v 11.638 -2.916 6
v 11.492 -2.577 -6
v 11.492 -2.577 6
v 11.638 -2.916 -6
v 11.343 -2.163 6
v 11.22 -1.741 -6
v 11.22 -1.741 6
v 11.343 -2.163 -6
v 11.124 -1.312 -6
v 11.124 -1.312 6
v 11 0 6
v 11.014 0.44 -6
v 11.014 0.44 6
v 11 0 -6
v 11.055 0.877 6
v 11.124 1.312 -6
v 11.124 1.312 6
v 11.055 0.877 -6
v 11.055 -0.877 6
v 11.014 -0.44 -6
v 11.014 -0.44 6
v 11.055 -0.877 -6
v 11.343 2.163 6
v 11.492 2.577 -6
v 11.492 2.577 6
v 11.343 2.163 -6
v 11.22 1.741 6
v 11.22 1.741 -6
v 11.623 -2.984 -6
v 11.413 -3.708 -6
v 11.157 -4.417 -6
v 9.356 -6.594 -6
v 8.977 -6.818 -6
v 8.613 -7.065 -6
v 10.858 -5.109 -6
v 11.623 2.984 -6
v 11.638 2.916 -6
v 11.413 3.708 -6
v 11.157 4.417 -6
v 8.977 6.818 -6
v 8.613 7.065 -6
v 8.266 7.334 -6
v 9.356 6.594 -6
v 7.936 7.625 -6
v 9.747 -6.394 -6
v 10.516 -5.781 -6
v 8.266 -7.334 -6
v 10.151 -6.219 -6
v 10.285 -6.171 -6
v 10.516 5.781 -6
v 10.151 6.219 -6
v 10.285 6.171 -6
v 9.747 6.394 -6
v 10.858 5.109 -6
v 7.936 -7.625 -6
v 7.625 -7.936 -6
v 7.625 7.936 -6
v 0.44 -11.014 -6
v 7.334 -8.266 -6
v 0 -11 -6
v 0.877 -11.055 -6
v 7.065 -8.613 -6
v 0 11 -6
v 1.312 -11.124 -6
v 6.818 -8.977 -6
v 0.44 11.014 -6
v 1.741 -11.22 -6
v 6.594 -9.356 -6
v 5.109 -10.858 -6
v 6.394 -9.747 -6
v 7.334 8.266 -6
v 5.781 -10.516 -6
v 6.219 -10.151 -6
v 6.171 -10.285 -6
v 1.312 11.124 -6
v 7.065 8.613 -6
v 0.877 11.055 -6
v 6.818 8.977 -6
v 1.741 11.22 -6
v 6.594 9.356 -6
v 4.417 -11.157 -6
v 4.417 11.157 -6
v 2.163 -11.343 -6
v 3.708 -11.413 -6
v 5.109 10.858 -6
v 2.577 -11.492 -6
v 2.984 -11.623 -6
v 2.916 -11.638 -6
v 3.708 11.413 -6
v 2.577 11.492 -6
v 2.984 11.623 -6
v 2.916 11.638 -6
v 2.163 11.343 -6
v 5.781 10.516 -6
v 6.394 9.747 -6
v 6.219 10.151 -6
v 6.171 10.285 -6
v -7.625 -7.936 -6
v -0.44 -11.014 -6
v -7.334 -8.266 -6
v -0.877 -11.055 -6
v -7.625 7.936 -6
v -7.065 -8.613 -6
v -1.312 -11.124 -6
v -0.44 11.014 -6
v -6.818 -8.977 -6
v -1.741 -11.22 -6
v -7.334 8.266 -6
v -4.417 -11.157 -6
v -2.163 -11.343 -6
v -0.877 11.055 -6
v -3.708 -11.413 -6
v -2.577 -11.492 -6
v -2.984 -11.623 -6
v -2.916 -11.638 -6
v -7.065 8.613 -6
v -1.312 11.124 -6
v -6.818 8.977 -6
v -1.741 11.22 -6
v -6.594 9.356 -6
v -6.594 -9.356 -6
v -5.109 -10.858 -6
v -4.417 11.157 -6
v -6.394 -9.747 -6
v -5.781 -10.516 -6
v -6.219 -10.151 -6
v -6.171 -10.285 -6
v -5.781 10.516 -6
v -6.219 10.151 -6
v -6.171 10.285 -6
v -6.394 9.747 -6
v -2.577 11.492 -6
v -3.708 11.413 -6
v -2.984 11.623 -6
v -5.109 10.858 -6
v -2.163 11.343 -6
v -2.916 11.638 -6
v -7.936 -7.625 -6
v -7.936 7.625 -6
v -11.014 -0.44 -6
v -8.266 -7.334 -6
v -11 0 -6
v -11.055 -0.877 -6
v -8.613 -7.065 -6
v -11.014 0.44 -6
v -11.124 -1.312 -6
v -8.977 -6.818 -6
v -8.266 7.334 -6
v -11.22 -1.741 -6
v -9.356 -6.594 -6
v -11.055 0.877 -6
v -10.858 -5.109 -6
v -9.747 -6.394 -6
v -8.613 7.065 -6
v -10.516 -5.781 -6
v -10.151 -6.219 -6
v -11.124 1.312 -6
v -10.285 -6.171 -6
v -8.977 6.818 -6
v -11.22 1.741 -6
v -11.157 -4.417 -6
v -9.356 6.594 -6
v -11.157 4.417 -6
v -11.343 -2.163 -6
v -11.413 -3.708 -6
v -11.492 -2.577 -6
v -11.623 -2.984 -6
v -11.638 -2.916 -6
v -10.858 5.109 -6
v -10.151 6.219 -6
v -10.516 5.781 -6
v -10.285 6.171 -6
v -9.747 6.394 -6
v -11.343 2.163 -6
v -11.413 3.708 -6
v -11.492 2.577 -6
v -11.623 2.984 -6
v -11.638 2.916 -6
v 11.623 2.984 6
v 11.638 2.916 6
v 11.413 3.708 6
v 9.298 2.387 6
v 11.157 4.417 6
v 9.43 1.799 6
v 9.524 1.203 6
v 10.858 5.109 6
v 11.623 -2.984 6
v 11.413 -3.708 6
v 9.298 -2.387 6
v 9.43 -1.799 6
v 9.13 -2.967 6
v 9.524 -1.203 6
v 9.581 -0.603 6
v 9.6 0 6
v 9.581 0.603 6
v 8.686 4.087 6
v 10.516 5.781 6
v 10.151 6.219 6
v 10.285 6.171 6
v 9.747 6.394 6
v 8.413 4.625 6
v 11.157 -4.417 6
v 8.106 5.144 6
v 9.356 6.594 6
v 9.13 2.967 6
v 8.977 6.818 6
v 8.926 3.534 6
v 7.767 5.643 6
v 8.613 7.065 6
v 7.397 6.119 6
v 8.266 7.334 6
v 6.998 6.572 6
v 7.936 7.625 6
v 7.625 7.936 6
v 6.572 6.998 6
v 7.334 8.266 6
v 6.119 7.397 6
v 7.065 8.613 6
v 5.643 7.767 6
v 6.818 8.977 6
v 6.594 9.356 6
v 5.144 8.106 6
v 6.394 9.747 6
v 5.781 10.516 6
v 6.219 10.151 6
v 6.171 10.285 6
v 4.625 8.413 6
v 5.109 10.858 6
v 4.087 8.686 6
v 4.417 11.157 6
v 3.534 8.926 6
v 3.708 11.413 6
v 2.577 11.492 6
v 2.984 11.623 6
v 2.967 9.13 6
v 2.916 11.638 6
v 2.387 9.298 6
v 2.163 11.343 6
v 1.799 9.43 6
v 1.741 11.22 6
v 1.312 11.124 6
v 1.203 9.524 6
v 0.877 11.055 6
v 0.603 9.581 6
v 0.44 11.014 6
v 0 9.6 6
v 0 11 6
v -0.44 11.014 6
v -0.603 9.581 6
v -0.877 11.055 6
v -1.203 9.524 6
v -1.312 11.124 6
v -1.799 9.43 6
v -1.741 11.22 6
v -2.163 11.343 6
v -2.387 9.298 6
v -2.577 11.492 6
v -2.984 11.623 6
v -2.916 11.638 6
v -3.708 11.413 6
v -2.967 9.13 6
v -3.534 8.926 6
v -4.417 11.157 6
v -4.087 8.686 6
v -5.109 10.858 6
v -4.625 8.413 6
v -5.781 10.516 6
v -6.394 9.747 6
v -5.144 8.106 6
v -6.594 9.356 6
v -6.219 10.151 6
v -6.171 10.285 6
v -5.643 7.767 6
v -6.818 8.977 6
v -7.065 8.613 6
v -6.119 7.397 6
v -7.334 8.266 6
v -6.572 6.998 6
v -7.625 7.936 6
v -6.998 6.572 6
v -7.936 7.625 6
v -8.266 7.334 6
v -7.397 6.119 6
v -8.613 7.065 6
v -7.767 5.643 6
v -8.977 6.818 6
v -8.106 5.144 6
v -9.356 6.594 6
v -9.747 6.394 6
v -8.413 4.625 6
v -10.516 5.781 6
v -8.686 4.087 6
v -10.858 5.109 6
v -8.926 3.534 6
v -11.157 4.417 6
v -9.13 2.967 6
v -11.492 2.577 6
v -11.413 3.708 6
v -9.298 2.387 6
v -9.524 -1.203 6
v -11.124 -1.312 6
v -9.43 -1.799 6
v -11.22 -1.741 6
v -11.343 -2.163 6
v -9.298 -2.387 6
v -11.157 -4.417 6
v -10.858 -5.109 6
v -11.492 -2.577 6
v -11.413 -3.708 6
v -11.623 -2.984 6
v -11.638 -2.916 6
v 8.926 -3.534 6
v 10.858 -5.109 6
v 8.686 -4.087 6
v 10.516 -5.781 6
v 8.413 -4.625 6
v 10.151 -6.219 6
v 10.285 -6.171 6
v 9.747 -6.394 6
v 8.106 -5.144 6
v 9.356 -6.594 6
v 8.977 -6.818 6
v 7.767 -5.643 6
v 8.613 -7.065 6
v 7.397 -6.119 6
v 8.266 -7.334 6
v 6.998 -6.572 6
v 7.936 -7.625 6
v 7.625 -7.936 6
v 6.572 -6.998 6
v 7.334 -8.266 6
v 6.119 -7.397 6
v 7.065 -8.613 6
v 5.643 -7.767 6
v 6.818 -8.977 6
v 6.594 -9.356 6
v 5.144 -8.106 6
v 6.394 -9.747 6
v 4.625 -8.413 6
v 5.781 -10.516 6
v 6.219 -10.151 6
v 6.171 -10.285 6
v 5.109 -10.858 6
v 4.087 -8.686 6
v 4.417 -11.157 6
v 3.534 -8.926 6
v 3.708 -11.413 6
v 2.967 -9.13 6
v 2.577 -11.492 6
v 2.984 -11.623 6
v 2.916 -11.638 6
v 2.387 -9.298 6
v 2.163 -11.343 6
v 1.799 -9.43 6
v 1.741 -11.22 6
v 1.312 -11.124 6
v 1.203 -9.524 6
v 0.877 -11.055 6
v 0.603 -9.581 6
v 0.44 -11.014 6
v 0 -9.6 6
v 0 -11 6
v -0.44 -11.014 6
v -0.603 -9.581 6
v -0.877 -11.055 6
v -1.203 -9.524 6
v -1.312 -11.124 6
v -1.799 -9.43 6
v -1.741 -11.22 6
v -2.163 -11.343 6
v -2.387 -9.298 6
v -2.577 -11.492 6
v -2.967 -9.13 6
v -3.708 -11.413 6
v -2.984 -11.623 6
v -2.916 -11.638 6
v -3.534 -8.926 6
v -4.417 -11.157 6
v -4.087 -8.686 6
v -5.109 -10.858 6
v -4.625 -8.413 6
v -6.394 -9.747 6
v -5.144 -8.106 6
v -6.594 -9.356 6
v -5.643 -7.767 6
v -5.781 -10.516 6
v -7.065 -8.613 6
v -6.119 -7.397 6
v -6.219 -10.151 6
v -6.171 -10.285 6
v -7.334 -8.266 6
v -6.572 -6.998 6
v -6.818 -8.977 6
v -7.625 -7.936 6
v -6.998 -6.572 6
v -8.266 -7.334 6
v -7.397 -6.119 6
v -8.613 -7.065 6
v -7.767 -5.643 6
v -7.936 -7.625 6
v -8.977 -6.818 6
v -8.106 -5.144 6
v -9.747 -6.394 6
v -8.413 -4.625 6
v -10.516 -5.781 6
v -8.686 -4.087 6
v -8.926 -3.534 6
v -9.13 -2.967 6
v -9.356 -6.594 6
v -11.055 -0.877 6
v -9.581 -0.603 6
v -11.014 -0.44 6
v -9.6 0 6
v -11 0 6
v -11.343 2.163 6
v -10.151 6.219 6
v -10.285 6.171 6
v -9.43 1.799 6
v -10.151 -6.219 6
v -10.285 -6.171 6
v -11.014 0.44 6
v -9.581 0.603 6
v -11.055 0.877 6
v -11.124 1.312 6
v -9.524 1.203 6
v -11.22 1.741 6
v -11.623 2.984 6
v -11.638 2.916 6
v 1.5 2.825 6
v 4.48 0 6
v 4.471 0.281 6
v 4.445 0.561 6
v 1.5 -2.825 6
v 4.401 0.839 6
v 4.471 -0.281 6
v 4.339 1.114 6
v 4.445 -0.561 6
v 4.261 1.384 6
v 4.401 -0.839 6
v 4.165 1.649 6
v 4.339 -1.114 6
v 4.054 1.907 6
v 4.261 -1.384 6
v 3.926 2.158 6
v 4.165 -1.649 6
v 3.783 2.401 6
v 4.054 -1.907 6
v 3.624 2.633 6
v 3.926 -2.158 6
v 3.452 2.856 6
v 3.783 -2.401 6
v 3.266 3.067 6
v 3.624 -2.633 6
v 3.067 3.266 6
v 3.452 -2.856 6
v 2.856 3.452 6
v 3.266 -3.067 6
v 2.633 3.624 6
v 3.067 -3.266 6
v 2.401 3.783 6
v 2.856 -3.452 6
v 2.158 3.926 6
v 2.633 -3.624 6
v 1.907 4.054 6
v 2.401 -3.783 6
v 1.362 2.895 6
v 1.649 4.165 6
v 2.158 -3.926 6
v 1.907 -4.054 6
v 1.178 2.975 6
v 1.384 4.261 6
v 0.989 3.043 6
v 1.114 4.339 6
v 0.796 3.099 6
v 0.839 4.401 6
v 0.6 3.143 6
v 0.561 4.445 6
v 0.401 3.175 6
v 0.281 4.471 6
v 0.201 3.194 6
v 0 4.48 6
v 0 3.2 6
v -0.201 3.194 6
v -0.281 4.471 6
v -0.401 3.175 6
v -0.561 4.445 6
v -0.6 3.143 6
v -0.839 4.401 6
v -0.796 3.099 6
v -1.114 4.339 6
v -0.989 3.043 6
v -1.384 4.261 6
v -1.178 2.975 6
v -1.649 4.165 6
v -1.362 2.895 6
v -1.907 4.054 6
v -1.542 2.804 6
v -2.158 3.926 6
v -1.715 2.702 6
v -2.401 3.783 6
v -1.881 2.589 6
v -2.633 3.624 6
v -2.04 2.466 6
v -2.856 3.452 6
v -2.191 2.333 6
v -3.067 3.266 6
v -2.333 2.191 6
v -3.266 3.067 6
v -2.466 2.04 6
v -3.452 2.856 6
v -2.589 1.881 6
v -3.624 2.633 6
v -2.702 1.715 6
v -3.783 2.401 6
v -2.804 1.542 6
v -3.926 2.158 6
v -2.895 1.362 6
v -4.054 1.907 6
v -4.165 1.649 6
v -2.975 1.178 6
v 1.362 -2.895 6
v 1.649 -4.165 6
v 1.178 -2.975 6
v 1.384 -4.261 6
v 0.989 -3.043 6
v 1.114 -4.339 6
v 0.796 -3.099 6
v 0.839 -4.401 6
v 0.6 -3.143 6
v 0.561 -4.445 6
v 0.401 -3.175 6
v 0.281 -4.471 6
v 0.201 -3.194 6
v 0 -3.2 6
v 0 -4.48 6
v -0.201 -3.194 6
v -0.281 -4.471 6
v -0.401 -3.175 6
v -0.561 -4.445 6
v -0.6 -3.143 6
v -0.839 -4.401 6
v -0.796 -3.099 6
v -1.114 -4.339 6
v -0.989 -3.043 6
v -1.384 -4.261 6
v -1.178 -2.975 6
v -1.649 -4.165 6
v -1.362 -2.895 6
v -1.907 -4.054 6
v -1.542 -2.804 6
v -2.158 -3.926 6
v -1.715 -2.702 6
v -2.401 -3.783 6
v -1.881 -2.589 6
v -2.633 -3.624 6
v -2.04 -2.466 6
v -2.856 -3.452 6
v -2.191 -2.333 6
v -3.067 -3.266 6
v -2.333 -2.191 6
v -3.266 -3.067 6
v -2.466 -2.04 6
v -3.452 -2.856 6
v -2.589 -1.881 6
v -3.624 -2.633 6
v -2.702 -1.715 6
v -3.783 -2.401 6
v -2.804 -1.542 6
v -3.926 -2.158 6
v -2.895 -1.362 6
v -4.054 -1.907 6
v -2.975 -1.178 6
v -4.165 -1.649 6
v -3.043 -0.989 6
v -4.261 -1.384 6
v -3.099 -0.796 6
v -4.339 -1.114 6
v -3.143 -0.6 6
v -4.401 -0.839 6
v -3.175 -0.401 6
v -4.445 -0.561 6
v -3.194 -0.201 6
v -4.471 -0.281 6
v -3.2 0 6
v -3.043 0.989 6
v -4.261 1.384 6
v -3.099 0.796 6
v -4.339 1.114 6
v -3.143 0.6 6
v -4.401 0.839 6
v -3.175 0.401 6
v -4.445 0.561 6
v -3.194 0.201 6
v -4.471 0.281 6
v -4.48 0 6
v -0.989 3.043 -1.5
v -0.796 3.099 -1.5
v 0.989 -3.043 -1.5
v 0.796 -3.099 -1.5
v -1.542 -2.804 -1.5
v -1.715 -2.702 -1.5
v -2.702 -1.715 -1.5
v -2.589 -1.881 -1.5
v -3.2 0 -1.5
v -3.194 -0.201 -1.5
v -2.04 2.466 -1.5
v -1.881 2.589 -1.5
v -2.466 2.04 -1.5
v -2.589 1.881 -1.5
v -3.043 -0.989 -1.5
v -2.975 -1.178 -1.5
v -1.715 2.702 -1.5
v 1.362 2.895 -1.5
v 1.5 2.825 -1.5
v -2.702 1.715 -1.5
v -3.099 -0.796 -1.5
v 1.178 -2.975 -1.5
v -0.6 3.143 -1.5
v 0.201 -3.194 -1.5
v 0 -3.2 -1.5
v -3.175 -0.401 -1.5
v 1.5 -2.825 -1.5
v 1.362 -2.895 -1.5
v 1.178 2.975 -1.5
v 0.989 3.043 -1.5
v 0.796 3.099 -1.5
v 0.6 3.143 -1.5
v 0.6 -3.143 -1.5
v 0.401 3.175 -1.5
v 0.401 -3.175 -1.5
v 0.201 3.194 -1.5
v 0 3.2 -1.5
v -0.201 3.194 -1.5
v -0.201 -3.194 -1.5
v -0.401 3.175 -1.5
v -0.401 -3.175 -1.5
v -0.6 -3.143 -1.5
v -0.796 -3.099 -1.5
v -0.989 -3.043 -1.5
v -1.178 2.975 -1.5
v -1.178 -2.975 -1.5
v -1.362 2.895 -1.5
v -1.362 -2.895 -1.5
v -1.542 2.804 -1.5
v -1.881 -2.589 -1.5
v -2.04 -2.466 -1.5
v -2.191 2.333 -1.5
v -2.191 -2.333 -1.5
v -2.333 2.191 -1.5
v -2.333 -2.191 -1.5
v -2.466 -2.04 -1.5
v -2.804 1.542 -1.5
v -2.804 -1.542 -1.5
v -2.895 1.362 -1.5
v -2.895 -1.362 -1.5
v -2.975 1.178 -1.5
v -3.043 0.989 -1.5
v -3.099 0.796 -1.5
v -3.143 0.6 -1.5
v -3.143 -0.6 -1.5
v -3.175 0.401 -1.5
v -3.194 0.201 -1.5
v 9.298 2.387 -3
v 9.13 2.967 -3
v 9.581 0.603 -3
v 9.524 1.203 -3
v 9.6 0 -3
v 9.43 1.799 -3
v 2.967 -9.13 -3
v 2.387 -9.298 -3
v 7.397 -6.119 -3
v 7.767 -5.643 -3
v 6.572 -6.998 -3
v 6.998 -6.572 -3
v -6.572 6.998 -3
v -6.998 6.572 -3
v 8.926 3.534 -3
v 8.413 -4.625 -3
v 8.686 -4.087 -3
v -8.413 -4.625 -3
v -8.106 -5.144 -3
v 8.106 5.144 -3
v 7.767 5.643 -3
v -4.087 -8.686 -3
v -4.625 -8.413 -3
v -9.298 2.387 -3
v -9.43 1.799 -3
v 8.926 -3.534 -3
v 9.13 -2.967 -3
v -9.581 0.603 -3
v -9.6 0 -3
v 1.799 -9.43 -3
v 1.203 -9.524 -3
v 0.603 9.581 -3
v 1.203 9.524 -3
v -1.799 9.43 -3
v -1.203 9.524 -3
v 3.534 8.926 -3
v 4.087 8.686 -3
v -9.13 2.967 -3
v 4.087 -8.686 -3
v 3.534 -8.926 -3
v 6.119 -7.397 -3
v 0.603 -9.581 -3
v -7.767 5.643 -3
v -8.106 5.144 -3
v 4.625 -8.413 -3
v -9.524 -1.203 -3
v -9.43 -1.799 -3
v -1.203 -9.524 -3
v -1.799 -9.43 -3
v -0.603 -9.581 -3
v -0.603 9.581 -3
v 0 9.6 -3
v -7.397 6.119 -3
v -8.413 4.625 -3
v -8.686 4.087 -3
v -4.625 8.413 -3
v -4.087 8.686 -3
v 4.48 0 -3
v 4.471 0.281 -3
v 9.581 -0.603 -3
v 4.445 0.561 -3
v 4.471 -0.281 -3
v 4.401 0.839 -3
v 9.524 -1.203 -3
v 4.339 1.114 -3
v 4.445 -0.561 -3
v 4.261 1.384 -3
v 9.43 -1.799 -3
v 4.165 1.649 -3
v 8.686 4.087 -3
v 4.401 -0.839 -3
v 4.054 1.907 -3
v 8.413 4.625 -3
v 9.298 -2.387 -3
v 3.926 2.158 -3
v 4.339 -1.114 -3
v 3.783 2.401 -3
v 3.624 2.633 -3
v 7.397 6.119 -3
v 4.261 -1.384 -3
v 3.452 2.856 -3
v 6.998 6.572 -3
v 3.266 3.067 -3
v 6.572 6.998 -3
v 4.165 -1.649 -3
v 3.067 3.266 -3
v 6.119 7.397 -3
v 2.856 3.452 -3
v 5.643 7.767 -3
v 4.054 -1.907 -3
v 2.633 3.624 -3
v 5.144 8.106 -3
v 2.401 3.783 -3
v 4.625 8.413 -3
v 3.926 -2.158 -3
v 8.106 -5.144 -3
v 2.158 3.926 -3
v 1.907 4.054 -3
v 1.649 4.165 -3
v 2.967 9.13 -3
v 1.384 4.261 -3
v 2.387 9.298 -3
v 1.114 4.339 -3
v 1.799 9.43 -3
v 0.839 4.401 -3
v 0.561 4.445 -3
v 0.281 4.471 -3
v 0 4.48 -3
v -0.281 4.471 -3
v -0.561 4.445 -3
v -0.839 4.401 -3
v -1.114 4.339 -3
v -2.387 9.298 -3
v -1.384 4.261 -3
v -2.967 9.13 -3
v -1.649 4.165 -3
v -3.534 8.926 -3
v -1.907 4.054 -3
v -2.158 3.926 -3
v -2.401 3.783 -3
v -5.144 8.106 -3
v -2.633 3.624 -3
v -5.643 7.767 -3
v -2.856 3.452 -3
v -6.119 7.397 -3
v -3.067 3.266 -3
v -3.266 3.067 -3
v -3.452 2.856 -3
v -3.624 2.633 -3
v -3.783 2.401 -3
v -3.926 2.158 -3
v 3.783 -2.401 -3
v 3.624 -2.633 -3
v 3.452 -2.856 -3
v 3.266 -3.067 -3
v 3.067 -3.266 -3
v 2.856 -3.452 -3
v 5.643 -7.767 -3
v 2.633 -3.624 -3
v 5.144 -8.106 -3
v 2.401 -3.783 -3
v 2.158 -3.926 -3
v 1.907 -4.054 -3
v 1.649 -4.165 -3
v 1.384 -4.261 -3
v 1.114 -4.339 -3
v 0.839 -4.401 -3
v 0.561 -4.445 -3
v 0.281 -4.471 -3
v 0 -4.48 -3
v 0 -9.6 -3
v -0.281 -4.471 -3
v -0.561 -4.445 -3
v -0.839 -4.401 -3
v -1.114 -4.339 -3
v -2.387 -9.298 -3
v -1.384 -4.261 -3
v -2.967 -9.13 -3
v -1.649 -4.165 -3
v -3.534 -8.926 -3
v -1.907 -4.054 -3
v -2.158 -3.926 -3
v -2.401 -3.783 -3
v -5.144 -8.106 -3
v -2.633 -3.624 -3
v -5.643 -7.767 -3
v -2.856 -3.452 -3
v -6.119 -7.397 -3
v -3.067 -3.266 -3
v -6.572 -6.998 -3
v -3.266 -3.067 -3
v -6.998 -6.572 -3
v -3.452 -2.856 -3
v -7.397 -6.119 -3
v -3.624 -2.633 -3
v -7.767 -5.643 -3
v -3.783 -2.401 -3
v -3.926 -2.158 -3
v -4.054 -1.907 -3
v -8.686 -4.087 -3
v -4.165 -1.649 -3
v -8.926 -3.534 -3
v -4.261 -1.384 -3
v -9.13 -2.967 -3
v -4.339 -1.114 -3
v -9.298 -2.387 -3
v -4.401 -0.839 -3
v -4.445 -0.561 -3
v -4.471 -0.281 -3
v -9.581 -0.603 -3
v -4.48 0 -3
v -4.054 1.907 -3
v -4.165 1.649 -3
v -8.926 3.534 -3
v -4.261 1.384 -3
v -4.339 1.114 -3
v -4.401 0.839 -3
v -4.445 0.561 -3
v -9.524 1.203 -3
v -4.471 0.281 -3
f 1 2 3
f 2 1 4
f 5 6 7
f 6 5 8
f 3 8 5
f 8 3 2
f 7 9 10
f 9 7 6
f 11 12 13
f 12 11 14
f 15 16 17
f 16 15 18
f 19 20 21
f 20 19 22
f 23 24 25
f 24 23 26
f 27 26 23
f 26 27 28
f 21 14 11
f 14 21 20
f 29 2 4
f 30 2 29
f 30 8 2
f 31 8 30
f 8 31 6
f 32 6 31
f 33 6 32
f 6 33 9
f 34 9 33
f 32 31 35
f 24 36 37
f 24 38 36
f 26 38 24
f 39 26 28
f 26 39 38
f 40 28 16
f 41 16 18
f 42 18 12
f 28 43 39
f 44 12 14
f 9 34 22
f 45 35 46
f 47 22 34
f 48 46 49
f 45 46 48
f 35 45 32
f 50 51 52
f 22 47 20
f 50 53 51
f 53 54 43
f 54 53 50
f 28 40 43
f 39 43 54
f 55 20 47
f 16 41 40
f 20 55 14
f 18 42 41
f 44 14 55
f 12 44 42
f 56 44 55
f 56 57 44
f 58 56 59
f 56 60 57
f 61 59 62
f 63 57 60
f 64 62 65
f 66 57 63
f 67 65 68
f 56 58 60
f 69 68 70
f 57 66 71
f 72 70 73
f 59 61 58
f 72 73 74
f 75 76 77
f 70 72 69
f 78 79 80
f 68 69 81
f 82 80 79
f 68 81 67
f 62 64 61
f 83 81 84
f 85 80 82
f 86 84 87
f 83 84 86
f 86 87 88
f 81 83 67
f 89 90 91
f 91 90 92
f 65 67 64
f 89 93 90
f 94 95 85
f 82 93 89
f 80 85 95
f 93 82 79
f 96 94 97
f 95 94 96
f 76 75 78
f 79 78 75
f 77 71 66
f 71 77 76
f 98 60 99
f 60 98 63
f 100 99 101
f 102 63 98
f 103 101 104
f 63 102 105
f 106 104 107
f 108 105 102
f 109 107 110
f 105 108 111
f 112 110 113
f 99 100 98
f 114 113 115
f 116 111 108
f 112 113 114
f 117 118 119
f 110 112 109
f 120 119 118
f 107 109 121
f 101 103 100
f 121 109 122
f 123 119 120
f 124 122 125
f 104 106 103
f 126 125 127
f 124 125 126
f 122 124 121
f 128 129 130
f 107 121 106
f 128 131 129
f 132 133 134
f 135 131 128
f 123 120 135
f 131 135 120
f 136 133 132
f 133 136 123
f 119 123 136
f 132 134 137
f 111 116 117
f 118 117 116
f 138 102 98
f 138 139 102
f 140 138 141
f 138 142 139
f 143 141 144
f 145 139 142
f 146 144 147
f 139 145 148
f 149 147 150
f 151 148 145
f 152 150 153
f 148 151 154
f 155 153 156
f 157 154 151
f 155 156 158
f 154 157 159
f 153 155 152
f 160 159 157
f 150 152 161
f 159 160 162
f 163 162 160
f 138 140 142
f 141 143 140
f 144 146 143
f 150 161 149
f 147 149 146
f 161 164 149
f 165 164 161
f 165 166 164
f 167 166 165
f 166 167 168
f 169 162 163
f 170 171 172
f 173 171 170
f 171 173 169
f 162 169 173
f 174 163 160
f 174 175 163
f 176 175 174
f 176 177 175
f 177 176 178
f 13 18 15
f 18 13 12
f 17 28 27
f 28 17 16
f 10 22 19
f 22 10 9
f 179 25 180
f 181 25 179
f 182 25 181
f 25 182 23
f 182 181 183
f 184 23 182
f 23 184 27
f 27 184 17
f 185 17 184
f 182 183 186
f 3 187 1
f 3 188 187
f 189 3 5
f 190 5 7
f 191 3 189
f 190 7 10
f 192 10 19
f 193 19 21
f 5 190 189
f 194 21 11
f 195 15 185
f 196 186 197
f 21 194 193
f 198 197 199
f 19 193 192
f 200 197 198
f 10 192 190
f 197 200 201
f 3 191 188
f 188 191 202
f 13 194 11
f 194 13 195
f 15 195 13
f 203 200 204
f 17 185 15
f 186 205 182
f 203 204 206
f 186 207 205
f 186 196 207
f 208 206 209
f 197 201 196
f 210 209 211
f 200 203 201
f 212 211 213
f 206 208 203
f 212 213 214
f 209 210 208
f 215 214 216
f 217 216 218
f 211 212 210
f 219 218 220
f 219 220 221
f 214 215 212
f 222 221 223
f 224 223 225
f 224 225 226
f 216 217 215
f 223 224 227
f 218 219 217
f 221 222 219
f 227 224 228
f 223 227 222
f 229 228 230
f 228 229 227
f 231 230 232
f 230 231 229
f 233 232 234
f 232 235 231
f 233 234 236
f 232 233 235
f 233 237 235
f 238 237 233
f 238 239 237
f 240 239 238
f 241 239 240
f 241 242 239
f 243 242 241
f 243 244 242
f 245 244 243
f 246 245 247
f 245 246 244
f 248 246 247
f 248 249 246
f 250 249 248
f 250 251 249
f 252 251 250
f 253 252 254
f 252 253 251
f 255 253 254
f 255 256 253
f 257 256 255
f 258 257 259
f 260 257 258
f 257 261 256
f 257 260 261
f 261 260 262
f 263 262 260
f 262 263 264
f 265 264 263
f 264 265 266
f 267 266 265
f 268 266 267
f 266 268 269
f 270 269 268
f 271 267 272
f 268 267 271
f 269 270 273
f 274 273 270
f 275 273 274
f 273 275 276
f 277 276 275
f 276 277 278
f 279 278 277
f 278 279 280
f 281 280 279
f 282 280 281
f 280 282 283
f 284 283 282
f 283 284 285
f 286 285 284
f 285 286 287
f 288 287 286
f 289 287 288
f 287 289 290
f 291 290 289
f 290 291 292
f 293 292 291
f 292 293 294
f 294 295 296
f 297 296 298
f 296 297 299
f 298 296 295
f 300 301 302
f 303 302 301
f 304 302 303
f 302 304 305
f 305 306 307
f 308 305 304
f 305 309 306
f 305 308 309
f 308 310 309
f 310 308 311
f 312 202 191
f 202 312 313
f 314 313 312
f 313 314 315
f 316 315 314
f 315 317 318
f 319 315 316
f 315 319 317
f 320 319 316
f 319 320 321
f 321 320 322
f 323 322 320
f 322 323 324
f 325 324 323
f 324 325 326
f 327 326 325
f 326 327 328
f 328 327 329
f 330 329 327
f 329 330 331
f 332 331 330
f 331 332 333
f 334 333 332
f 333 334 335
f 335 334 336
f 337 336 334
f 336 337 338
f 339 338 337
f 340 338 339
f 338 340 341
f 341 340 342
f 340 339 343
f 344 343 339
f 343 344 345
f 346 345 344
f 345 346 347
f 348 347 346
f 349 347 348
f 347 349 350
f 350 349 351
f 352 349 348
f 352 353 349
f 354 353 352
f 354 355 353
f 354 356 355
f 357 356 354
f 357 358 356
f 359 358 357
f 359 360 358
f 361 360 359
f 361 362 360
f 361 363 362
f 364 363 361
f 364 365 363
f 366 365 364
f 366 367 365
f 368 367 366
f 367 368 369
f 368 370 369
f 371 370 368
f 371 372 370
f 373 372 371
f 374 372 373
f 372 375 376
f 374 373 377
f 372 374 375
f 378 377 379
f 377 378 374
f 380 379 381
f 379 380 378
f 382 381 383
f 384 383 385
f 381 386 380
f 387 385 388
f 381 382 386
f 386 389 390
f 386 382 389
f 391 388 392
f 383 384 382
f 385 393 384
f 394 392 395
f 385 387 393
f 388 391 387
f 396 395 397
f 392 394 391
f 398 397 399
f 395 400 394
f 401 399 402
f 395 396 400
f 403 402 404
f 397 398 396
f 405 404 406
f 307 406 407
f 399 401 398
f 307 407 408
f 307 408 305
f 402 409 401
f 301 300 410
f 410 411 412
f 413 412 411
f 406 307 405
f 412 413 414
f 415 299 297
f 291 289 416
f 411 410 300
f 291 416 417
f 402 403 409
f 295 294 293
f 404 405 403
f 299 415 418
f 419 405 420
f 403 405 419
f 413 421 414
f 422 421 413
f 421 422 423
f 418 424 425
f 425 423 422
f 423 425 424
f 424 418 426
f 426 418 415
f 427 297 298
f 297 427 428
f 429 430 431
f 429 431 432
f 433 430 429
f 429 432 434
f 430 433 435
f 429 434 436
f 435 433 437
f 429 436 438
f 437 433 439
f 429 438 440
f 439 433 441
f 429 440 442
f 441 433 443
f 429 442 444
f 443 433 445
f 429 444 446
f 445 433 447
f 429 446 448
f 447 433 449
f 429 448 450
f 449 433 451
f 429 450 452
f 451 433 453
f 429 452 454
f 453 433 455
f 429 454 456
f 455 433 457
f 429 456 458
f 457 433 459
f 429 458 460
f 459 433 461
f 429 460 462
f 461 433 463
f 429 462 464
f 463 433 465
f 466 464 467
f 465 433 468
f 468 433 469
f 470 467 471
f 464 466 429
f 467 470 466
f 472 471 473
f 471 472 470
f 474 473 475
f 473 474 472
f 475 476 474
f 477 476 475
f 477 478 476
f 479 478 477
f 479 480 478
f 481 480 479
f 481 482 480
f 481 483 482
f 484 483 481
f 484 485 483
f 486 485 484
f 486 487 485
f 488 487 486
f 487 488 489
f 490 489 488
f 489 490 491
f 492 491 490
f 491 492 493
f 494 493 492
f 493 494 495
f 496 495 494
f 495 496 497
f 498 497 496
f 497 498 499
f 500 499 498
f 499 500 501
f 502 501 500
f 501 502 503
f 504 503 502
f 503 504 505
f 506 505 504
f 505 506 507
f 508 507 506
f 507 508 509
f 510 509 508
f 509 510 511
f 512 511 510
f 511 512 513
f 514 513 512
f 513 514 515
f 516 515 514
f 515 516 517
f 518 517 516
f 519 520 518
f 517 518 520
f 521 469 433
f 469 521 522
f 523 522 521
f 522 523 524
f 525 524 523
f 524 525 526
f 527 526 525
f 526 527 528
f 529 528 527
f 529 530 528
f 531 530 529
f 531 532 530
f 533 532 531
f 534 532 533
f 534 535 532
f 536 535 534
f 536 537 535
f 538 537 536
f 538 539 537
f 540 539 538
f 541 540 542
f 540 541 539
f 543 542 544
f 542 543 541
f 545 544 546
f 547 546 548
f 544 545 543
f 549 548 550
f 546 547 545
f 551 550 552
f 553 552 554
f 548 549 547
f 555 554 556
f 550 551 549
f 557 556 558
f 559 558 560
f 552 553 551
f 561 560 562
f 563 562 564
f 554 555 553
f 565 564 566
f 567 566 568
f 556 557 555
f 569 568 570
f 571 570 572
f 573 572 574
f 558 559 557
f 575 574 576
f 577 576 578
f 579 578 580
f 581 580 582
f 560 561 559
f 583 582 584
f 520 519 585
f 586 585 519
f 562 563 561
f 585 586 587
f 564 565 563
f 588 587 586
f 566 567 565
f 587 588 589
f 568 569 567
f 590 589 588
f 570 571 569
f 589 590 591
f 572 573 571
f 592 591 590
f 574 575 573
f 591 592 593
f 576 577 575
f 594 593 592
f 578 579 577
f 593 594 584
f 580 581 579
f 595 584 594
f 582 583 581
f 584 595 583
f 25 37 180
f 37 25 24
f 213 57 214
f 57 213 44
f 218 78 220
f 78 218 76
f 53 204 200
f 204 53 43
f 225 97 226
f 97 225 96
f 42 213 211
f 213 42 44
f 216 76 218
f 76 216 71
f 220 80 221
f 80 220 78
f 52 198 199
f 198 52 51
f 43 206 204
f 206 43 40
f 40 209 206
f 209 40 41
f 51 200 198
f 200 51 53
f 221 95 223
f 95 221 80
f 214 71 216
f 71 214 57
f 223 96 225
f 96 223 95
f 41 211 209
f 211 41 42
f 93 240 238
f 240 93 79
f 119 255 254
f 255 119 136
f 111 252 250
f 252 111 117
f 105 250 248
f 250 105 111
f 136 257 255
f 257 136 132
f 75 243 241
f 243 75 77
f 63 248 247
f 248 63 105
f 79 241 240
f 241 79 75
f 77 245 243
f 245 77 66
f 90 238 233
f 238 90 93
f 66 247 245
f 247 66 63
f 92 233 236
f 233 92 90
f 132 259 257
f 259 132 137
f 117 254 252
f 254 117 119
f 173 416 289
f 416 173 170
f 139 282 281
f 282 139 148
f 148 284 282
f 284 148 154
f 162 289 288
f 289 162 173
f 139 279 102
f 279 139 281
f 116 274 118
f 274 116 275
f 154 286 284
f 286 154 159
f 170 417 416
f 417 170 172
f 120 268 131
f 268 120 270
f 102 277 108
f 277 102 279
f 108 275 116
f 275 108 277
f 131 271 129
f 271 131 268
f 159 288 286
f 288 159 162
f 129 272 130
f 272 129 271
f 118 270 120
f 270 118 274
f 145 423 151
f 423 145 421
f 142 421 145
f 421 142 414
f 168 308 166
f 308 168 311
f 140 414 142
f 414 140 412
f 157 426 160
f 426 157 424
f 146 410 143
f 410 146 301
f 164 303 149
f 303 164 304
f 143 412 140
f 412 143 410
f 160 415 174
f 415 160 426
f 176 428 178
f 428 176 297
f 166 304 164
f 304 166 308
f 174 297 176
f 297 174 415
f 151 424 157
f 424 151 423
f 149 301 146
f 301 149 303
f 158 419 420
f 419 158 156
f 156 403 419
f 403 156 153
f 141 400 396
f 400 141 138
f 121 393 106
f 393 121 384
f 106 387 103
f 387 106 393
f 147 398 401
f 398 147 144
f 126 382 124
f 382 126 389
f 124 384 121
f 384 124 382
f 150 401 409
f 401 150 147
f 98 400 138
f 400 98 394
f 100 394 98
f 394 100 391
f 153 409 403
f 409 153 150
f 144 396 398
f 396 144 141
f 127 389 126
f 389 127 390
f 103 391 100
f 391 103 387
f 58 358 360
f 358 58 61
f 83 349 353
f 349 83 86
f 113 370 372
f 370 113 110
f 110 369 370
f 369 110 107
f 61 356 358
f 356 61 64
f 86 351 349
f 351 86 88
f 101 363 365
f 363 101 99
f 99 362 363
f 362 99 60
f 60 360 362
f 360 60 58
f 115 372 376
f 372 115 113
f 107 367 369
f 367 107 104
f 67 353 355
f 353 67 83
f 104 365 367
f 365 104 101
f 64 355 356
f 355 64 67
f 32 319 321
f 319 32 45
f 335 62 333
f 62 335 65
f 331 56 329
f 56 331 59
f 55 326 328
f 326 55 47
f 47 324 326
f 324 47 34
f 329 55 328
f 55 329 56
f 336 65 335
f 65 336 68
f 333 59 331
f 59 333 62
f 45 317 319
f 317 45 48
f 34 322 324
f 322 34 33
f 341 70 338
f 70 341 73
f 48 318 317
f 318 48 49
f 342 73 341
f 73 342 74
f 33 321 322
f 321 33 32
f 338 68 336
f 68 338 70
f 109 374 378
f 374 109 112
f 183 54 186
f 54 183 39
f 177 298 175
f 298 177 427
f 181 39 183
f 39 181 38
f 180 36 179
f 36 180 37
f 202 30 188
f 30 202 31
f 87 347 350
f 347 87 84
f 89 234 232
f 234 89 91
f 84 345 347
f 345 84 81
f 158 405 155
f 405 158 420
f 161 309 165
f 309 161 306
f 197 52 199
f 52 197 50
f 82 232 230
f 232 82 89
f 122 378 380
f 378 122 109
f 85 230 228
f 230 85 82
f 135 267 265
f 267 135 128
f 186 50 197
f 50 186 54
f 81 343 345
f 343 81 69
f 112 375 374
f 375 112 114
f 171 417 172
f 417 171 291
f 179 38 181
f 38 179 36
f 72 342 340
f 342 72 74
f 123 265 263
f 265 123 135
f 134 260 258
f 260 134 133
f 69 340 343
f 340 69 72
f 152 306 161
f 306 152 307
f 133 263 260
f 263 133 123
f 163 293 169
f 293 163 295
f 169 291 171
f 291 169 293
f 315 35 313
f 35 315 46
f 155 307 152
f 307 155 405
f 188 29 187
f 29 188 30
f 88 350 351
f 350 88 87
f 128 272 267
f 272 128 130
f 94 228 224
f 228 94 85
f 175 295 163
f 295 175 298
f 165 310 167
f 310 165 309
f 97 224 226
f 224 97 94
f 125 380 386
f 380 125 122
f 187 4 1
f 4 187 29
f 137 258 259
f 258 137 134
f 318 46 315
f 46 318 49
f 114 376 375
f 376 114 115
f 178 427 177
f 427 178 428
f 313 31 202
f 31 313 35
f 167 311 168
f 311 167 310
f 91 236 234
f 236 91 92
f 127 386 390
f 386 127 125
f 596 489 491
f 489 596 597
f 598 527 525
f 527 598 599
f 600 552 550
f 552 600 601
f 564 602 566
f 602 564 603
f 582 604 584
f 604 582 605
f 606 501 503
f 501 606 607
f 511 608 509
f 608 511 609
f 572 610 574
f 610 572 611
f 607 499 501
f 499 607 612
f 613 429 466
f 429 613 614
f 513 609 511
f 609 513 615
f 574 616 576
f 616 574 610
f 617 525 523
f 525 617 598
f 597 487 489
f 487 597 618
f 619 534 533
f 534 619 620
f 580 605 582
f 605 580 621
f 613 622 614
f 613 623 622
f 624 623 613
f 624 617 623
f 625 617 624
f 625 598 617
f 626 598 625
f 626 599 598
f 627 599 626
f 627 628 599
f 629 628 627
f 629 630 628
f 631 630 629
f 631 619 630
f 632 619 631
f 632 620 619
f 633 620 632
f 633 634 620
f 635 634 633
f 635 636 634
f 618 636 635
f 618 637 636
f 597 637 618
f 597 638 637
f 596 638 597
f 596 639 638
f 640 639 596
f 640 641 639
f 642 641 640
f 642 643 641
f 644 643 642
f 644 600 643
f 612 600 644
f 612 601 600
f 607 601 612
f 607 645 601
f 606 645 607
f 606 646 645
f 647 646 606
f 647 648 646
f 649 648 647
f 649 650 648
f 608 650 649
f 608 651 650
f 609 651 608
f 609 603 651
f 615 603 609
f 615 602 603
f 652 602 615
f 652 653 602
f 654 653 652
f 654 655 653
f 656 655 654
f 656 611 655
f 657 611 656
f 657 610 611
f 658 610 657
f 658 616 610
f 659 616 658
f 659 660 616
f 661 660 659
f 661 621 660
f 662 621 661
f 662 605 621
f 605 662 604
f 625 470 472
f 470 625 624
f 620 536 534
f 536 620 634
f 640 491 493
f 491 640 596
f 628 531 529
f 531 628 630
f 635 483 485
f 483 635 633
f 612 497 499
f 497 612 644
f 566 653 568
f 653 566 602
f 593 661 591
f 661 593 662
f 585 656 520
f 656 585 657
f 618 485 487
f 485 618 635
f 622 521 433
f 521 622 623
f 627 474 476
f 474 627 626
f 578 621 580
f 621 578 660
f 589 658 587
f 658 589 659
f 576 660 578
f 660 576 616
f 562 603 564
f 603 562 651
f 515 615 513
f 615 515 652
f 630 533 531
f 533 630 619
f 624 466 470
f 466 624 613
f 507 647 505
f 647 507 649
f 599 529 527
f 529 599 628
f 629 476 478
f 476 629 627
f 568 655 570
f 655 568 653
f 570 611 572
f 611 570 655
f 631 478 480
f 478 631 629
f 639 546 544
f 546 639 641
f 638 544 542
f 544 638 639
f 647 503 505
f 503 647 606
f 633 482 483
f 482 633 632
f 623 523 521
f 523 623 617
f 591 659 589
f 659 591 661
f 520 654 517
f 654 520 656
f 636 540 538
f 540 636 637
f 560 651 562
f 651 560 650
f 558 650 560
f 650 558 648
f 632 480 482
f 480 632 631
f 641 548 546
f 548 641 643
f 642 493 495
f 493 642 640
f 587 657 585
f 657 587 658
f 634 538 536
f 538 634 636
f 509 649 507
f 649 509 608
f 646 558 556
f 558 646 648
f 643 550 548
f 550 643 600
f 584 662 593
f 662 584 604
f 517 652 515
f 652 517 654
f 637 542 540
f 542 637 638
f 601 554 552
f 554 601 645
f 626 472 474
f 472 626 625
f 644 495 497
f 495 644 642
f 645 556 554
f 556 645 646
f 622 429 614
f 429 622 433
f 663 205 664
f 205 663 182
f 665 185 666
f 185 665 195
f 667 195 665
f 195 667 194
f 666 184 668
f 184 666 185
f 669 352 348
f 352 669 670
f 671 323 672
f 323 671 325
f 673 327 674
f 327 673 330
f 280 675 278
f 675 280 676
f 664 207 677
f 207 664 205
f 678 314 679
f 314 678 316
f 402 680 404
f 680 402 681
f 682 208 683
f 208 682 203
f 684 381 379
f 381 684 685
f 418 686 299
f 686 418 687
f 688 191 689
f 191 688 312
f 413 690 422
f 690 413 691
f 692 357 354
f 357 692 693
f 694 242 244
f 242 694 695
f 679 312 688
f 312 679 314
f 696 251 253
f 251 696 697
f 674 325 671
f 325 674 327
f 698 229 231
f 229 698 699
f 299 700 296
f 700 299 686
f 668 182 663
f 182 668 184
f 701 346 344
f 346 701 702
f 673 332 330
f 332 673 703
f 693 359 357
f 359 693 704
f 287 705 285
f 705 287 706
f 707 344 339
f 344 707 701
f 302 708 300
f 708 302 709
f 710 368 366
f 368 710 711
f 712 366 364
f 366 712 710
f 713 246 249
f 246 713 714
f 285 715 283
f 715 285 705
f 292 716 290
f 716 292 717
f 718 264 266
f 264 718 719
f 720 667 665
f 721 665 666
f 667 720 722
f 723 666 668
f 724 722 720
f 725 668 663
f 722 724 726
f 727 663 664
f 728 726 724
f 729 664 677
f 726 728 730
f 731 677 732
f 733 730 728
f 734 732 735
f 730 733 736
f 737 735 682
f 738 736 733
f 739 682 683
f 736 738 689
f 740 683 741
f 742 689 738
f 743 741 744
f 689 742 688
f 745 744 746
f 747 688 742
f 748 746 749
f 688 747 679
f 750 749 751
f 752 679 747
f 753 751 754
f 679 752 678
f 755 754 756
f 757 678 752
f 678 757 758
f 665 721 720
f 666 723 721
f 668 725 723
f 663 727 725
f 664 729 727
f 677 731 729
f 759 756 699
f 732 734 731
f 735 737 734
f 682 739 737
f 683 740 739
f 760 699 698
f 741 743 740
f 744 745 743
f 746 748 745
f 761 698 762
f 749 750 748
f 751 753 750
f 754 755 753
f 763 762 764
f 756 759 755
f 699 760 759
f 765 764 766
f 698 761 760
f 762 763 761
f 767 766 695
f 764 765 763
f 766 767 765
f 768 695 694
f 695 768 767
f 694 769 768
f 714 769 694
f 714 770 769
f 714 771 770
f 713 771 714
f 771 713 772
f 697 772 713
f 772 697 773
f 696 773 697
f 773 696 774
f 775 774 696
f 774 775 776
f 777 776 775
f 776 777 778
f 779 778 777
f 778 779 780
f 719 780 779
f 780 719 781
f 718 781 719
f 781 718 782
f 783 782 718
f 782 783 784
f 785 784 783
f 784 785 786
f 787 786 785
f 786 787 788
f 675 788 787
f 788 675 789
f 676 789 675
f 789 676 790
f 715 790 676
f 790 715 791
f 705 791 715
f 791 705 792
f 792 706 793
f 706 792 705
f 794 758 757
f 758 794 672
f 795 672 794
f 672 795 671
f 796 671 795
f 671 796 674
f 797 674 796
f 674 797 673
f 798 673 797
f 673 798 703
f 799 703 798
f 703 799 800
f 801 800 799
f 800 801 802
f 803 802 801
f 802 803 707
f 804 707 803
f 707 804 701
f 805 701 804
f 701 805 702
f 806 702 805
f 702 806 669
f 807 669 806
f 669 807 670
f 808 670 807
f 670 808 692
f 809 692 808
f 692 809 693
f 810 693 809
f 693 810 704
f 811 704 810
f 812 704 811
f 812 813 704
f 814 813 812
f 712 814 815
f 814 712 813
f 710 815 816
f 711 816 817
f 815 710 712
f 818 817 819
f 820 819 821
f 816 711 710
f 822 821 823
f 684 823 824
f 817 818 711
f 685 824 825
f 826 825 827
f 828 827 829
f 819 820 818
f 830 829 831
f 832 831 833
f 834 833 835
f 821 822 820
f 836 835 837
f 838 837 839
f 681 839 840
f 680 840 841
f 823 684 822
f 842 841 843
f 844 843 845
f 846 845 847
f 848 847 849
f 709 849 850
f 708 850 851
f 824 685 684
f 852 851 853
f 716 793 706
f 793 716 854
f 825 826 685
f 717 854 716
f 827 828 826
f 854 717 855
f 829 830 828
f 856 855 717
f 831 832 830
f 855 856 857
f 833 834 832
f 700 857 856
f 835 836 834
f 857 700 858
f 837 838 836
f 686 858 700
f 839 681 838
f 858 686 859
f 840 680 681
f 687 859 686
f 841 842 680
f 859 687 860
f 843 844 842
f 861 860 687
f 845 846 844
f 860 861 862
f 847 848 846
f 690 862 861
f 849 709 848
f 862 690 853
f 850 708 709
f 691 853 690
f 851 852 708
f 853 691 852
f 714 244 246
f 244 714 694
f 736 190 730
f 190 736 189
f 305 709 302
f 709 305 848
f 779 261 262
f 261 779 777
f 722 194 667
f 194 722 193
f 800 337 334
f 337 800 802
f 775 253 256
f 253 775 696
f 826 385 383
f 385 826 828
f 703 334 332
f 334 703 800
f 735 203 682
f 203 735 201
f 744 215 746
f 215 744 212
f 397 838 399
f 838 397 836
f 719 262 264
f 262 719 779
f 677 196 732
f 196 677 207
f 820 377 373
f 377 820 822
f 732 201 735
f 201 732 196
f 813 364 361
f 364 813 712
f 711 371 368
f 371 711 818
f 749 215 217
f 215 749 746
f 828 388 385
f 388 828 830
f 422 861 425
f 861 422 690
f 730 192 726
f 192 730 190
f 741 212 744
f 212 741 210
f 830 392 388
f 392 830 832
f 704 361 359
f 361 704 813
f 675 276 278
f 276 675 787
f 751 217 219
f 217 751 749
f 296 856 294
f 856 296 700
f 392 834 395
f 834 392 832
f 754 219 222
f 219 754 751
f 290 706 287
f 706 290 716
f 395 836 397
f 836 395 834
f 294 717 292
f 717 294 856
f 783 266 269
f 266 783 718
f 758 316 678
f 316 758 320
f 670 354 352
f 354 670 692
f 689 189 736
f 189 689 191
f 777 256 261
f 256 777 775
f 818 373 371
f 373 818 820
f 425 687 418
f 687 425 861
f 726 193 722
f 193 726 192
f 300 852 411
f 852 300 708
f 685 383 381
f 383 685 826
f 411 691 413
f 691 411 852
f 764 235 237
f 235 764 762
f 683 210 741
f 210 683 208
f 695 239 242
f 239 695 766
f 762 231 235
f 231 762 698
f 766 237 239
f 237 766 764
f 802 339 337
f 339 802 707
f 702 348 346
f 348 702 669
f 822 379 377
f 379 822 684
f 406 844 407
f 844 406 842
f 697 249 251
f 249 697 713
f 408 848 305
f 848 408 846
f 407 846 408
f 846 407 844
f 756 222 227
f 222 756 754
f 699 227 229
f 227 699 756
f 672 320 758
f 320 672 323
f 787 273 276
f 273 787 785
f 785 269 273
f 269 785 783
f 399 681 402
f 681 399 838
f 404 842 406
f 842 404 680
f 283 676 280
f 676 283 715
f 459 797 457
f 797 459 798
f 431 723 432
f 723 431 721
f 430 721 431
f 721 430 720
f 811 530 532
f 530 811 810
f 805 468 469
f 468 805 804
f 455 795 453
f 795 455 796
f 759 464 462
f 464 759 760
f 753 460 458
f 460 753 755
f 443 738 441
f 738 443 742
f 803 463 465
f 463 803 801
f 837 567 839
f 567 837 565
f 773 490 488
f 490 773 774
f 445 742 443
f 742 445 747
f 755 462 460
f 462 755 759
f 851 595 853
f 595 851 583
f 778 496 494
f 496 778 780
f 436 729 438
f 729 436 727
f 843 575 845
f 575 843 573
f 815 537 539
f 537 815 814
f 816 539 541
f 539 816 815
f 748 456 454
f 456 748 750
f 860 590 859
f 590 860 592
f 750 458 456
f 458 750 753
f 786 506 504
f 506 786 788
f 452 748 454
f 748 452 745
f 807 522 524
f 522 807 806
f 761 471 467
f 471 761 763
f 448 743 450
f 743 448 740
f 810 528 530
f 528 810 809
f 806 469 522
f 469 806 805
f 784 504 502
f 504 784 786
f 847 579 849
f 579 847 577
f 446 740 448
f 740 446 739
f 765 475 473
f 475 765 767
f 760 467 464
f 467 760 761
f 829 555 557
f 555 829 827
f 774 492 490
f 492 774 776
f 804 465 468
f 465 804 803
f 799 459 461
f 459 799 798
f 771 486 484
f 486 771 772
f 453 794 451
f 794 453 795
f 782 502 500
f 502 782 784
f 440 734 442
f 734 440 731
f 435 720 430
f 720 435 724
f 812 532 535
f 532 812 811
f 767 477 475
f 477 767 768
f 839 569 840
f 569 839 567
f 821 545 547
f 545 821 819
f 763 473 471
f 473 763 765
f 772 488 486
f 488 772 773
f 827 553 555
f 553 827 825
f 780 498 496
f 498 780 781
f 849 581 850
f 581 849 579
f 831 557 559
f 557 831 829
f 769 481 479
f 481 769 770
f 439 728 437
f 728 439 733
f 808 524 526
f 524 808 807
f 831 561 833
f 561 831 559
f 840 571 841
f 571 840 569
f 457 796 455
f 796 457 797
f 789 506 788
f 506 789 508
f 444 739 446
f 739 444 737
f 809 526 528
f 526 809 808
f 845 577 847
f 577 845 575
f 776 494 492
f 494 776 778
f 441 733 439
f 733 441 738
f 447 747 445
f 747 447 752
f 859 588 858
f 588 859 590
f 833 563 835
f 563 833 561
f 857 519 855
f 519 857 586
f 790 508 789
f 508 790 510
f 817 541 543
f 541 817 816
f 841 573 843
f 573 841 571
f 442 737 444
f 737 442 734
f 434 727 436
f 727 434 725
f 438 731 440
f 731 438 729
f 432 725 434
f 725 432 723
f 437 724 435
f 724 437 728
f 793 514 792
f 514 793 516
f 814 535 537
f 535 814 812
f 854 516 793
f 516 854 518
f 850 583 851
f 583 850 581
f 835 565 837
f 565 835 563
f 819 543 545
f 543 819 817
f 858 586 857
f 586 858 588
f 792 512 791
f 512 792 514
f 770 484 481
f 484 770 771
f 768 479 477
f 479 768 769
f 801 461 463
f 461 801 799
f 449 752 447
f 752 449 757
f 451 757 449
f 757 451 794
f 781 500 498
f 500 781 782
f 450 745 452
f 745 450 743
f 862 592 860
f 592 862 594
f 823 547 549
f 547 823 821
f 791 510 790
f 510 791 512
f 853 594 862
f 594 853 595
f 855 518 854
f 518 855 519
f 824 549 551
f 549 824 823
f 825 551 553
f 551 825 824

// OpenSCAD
$fn = 100;

r = 12;
h = 12;

center_r = 3.2;

mol_r = 7;
mol_off = 6;

difference() {
    union() {
        difference() {
            cylinder(h=h, r=r, center=true);
            translate([0,0,h/2])
                cylinder(h=15, r=center_r, center=true);
            for(i=[0:45:359]) {
                echo((r+mol_off*sin(i)));
                translate([(r+mol_off)*cos(i),(r+mol_off)
                *sin(i),0])
                    cylinder(h=h, r=mol_r, center=true);
            }
        }
        translate([3,0,0])
            cube([3,2*center_r,h], center=true);
    }
    difference() {
        translate([0,0,3])
            cylinder(h=h, r=0.8*r, center=true);
        translate([0,0,3])
            cylinder(h=h, r=1.4*center_r, center=true);
        
    }
}
